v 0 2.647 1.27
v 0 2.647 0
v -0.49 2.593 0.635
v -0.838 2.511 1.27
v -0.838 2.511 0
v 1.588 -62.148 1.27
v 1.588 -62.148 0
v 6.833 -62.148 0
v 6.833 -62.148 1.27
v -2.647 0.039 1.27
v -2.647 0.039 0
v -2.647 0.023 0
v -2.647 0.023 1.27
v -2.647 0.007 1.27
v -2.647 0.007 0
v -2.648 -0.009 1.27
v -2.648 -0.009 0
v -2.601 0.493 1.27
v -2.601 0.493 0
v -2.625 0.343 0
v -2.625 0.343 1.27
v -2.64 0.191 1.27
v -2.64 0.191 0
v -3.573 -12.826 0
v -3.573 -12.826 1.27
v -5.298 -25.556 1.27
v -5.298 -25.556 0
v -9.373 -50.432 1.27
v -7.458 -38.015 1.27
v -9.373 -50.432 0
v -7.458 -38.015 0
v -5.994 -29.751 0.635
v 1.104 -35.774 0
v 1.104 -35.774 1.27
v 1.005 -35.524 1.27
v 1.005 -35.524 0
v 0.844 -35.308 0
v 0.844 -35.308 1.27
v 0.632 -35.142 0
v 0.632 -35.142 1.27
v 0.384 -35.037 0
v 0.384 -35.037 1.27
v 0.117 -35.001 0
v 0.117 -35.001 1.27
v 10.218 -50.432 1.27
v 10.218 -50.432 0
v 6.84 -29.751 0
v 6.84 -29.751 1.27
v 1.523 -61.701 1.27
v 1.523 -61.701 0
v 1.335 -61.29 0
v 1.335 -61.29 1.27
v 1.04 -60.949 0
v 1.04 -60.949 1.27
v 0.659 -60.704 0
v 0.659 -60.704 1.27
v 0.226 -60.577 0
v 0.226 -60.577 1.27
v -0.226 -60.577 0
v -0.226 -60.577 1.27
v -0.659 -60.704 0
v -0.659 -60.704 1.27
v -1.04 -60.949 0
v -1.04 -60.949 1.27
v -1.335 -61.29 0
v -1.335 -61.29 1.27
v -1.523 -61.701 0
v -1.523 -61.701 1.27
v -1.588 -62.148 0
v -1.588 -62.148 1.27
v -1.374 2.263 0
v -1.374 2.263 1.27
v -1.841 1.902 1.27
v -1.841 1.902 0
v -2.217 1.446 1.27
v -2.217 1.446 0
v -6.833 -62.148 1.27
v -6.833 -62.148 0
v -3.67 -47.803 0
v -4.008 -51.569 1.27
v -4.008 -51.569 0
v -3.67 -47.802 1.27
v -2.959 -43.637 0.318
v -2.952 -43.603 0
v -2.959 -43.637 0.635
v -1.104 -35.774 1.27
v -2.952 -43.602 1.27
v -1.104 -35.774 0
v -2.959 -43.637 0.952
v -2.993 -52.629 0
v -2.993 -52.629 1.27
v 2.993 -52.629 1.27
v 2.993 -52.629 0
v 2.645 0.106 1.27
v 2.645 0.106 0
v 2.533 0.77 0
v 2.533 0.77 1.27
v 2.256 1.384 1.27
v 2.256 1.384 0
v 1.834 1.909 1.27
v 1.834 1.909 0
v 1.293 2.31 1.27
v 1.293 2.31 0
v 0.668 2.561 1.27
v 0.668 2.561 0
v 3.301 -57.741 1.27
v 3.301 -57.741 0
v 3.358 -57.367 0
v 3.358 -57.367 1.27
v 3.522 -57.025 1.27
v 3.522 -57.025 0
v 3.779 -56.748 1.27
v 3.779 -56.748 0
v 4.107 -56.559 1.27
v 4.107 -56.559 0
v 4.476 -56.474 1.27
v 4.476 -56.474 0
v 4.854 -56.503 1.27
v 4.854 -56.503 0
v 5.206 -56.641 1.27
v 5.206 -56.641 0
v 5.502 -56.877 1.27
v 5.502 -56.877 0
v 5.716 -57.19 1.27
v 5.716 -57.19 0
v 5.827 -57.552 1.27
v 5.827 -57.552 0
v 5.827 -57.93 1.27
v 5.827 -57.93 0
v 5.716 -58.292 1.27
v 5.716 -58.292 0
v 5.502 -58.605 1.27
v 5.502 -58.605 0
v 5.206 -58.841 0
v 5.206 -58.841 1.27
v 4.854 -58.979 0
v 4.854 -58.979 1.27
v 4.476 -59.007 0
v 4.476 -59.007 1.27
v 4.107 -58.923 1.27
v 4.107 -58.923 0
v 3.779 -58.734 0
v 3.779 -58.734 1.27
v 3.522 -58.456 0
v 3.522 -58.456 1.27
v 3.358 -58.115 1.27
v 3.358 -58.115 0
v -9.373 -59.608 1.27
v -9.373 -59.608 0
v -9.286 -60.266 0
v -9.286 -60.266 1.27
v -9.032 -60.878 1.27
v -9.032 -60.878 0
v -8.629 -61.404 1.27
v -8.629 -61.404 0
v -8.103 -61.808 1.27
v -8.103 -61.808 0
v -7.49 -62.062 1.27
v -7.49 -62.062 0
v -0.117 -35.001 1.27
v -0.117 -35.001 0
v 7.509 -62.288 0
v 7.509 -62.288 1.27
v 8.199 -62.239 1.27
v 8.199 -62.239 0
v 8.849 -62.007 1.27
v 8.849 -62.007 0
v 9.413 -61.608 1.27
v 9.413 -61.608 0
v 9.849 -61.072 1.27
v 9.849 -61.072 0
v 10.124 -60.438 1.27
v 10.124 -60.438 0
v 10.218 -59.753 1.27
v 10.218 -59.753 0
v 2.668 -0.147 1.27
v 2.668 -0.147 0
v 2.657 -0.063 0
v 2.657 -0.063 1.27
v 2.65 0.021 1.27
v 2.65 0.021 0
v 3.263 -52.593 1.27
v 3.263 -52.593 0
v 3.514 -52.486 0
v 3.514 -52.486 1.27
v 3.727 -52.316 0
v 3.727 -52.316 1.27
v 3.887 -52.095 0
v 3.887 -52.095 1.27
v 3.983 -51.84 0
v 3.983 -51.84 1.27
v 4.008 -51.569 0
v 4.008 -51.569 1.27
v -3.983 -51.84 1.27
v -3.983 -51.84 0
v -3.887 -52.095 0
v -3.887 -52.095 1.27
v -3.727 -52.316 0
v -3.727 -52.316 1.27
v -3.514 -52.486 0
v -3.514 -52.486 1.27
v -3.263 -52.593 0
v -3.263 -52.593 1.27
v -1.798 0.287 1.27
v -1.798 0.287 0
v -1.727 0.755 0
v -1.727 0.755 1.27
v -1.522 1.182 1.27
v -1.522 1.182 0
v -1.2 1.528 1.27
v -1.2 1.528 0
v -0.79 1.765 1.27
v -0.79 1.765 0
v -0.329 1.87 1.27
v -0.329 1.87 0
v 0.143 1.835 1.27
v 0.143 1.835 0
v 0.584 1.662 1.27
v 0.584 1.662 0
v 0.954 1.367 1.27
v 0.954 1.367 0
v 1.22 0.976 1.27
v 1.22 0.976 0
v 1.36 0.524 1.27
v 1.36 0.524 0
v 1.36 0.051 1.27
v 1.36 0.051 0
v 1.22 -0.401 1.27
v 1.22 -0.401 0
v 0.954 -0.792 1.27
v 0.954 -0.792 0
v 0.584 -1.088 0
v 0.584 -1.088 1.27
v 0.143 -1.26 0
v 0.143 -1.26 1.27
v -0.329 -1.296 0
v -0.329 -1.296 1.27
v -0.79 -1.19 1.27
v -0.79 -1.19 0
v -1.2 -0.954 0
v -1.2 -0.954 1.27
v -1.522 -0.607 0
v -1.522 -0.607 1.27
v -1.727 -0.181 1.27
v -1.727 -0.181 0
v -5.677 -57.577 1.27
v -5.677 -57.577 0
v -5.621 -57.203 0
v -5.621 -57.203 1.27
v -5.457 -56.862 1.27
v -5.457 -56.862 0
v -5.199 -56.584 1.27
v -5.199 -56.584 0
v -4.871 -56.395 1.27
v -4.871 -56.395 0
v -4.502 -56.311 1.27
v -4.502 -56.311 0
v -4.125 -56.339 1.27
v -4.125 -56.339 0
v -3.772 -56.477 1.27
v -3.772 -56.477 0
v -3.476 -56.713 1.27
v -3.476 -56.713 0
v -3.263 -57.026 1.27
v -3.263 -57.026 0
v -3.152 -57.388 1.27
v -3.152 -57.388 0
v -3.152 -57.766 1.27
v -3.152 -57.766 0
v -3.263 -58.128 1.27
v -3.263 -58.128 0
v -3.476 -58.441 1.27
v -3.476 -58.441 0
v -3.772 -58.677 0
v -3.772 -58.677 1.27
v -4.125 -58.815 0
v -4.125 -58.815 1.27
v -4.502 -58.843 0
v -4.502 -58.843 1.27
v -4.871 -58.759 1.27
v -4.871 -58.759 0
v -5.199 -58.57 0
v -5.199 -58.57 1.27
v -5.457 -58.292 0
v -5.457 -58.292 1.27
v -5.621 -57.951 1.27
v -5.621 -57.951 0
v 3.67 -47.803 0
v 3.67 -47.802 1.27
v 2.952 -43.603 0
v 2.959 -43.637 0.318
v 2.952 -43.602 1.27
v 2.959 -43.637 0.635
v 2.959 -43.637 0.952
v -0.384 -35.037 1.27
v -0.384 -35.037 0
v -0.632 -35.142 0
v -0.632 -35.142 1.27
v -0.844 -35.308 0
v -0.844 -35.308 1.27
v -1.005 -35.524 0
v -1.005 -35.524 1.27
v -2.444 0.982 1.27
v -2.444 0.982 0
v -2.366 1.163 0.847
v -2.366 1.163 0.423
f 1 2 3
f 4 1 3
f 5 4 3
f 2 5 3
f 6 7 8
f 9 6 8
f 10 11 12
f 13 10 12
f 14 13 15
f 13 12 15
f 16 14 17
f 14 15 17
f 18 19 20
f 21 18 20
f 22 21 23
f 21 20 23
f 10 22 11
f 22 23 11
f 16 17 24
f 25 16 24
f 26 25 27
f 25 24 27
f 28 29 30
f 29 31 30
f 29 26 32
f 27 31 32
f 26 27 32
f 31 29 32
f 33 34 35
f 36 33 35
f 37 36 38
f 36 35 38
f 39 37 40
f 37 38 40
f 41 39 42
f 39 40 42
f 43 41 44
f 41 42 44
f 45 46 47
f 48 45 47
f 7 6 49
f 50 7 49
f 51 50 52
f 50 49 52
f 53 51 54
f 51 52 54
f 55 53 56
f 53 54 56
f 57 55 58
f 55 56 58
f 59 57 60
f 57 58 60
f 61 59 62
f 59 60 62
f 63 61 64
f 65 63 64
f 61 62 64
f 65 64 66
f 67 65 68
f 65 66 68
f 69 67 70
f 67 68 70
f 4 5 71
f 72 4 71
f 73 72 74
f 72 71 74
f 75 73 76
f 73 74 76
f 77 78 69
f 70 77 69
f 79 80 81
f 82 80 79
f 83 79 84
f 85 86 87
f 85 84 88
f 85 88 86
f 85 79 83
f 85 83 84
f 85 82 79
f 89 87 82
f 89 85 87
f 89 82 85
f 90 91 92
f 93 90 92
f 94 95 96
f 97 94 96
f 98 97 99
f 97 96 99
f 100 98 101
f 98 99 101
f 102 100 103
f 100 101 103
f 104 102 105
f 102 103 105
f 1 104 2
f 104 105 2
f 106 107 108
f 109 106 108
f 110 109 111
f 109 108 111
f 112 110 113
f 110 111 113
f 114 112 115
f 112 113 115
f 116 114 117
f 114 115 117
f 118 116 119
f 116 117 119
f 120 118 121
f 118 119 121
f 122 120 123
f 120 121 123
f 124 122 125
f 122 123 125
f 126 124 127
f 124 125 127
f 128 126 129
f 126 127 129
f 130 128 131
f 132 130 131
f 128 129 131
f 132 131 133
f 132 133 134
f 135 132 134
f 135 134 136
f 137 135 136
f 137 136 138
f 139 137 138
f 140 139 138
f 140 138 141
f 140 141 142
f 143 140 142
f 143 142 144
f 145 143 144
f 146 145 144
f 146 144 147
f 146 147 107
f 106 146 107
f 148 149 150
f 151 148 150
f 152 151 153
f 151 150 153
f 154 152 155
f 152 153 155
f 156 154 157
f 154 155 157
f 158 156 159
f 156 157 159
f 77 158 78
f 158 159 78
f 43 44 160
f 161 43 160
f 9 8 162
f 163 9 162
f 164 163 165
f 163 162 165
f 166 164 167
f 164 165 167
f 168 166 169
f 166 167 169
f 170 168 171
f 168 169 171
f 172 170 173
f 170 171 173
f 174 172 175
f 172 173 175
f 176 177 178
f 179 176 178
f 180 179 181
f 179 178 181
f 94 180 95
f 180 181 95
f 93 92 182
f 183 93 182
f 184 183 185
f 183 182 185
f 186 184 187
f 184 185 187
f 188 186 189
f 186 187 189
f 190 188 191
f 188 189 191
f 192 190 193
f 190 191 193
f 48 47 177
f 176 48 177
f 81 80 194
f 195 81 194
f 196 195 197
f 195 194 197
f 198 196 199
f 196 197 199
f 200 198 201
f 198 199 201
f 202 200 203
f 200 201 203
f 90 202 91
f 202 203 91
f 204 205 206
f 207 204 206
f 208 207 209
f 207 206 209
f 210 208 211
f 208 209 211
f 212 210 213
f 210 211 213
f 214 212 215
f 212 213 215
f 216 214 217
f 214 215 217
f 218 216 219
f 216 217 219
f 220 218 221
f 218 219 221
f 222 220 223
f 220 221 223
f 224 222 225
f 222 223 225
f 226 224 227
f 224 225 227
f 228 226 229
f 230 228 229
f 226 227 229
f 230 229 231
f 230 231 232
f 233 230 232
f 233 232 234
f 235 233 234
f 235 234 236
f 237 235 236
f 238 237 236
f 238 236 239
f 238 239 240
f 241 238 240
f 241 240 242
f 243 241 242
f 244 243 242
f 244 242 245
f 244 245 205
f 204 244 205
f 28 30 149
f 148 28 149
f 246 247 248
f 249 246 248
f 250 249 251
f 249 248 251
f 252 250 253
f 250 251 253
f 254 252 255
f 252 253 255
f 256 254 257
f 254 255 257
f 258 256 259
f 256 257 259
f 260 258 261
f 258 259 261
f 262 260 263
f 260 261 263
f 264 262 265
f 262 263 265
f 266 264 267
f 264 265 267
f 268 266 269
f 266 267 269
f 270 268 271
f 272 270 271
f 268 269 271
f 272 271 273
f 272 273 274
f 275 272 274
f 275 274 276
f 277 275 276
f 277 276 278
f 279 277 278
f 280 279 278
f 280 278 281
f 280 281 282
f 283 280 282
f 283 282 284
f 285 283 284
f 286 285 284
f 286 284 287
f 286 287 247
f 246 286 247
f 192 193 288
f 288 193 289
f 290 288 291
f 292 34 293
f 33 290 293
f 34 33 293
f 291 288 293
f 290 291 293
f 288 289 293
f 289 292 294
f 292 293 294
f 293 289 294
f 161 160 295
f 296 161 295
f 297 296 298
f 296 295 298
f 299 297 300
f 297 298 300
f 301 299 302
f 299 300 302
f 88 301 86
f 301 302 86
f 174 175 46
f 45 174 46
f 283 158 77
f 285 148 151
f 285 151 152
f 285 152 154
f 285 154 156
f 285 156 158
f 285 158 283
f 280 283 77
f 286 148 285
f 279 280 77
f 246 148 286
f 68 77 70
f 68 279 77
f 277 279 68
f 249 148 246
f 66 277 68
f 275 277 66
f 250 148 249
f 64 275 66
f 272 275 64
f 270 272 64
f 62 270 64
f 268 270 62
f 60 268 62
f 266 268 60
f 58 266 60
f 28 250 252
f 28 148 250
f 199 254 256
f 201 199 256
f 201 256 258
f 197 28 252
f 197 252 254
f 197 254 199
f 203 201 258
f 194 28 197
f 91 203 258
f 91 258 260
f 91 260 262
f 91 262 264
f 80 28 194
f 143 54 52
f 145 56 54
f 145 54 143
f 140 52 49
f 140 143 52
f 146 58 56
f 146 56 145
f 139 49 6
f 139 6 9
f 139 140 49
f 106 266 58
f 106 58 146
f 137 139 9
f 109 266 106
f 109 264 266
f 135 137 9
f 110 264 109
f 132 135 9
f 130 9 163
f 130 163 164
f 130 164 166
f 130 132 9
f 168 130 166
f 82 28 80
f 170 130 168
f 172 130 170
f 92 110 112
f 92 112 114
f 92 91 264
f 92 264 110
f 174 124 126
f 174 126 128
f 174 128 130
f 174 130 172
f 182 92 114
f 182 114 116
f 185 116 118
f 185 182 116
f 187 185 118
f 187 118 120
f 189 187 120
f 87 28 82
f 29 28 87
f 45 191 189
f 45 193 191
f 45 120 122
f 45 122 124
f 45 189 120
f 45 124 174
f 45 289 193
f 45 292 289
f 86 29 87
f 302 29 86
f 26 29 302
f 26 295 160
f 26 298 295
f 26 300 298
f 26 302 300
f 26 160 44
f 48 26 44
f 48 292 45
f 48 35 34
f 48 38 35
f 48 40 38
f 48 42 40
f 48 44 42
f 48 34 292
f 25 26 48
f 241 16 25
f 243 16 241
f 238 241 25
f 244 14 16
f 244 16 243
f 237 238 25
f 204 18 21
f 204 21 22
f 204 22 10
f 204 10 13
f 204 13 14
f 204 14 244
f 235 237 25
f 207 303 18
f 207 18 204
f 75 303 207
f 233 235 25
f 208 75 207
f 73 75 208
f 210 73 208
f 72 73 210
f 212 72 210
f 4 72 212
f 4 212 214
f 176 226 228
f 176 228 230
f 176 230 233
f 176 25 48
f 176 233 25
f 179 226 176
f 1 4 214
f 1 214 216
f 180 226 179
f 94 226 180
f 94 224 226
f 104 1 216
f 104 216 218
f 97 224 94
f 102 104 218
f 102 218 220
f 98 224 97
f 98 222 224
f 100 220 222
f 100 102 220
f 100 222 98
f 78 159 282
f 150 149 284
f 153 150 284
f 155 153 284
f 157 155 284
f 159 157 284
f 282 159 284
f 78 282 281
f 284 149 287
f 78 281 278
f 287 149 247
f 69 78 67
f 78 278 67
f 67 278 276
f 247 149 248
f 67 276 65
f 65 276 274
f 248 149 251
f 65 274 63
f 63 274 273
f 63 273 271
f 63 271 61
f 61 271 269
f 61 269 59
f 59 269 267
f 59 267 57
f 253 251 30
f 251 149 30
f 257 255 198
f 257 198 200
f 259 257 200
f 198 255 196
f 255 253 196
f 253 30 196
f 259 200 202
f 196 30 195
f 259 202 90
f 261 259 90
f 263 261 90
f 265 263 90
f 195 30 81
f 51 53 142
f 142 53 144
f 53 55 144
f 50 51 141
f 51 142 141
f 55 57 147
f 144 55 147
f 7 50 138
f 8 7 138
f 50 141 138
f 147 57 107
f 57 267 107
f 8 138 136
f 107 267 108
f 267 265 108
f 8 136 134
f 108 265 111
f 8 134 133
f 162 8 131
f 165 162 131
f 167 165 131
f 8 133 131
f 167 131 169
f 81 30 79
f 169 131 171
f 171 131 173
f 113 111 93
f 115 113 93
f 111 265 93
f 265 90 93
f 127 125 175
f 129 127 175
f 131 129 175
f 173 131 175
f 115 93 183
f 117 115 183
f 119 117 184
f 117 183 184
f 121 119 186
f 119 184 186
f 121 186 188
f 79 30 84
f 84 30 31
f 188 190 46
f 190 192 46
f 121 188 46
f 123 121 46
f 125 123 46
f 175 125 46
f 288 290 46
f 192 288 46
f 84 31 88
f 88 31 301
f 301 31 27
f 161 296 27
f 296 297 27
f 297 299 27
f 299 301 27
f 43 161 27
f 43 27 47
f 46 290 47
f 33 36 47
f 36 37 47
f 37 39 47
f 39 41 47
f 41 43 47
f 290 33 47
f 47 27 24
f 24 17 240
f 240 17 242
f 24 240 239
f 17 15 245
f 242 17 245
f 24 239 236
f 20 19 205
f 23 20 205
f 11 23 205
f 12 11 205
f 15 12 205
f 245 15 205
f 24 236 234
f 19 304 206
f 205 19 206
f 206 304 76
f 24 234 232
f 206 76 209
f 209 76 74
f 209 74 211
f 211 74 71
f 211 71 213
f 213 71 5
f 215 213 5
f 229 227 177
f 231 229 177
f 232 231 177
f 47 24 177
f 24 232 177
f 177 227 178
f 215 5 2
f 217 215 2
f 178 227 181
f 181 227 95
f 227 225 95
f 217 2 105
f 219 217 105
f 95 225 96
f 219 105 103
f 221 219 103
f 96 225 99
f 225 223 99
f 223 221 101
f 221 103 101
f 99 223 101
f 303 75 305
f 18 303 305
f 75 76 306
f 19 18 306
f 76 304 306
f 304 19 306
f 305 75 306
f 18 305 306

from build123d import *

# Parameters (mm, degrees)
BOSS_EXTRUDE1_DEPTH = 1.27
CUT_EXTRUDE2_DEPTH  = 64.13835029
SKETCH4_R           = 1.27
SKETCH4_R_2         = 1.5875
CUT_EXTRUDE3_DEPTH  = 64.13835029


with BuildPart() as part:
    # Sketch1 → Boss-Extrude1 (new body)
    with BuildSketch(Plane.XY):
        with BuildLine():
            Line((-6.832612328, -62.148292065), (6.8326, -62.148292065))
            ThreePointArc((6.8326, -62.148292065), (9.145004667, -61.82662212), (10.217979737, -59.753119914))
            Line((10.217979737, -59.753119914), (10.217979737, -50.431712328))
            Line((10.217979737, -50.431712328), (6.839792065, -29.750592065))
            Line((6.839792065, -29.750592065), (2.667806008, -0.146870092))
            ThreePointArc((2.667806008, -0.146870092), (2.653236727, -0.020752709), (2.644987367, 0.105935121))
            ThreePointArc((2.644987367, 0.105935121), (1.833951843, 1.908874292), (0, 2.647107935))
            add(Edge.make_bspline(
                [(0, 2.647107935), (-0.561984482, 2.60663561), (-0.837703259, 2.51106226)],
                knots=[0, 0, 0, 0.00724911, 0.00724911, 0.00724911], degree=2))
            ThreePointArc((-0.837703259, 2.51106226), (-1.617455697, 2.09547548), (-2.216994409, 1.446414952))
            add(Edge.make_bspline(
                [(-2.216994409, 1.446414952), (-2.348446751, 1.249612458), (-2.562206256, 0.722759125), (-2.600800514, 0.492967657)],
                knots=[0.022131974, 0.022131974, 0.022131974, 0.022131974, 0.030911059, 0.030911059, 0.030911059, 0.030911059], degree=3))
            ThreePointArc((-2.600800514, 0.492967657), (-2.63362686, 0.266814516), (-2.646825425, 0.038672871))
            ThreePointArc((-2.646825425, 0.038672871), (-2.647287537, 0.01475577), (-2.647974875, -0.009155919))
            add(Edge.make_bspline(
                [(-2.647974875, -0.009155919), (-2.982966974, -10.021345785), (-5.211696232, -26.748717576), (-8.559038061, -43.581295567), (-9.3726, -50.4317)],
                knots=[0.035874882, 0.035874882, 0.035874882, 0.035874882, 0.412185068, 0.675162616, 0.675162616, 0.675162616, 0.675162616], degree=3))
            Line((-9.3726, -50.4317), (-9.3726, -59.608304393))
            ThreePointArc((-9.3726, -59.608304393), (-8.628654835, -61.4043469), (-6.832612328, -62.148292065))
        make_face()
    extrude(amount=BOSS_EXTRUDE1_DEPTH)

    # Sketch2 → Cut-Extrude2 (cut, through all)
    with BuildSketch(Plane.XY.offset(1.27)):
        with BuildLine():
            ThreePointArc((1.5875, -62.148292065), (0, -60.560792065), (-1.5875, -62.148292065))
            Line((-1.5875, -62.148292065), (1.5875, -62.148292065))
        make_face()
        with BuildLine():
            Line((-2.993002621, -52.629071042), (2.993002621, -52.629071042))
            ThreePointArc((2.993002621, -52.629071042), (3.726800948, -52.31577725), (4.008051125, -51.569110442))
            add(Edge.make_bspline(
                [(4.008051125, -51.569110442), (3.970454208, -50.700999098), (3.762157848, -48.039220625), (3.064677271, -43.892588352), (2.039593657, -39.517305496), (1.382803309, -36.905376029), (1.10391193, -35.774249306)],
                knots=[0.059039804, 0.059039804, 0.059039804, 0.059039804, 0.20424764, 0.505314101, 0.760840146, 0.955648589, 0.955648589, 0.955648589, 0.955648589], degree=3))
            ThreePointArc((1.10391193, -35.774249306), (0.744009182, -35.217668165), (0.11745403, -35.001471042))
            Line((0.11745403, -35.001471042), (-0.11745403, -35.001471042))
            ThreePointArc((-0.11745403, -35.001471042), (-0.744009182, -35.217668165), (-1.10391193, -35.774249306))
            add(Edge.make_bspline(
                [(-4.008051125, -51.569110442), (-3.970454208, -50.700999098), (-3.762157848, -48.039220625), (-3.064677271, -43.892588352), (-2.039593657, -39.517305496), (-1.382803309, -36.905376029), (-1.10391193, -35.774249306)],
                knots=[0.059039804, 0.059039804, 0.059039804, 0.059039804, 0.20424764, 0.505314101, 0.760840146, 0.955648589, 0.955648589, 0.955648589, 0.955648589], degree=3))
            ThreePointArc((-4.008051125, -51.569110442), (-3.726800948, -52.31577725), (-2.993002621, -52.629071042))
        make_face()
    extrude(amount=-CUT_EXTRUDE2_DEPTH, mode=Mode.SUBTRACT)

    # Sketch4 → Cut-Extrude3 (cut, through all)
    with BuildSketch(Plane(origin=(0, 0, 0), x_dir=(-1, 0, 0), z_dir=(0, 0, -1))):
        with Locations((4.407451174, -57.57698217)):
            Circle(SKETCH4_R)
        with Locations((-4.571309894, -57.740840891)):
            Circle(SKETCH4_R)
        with Locations((0.210042576, 0.287306268)):
            Circle(SKETCH4_R_2)
    extrude(amount=-CUT_EXTRUDE3_DEPTH, mode=Mode.SUBTRACT)


solid = part.part
